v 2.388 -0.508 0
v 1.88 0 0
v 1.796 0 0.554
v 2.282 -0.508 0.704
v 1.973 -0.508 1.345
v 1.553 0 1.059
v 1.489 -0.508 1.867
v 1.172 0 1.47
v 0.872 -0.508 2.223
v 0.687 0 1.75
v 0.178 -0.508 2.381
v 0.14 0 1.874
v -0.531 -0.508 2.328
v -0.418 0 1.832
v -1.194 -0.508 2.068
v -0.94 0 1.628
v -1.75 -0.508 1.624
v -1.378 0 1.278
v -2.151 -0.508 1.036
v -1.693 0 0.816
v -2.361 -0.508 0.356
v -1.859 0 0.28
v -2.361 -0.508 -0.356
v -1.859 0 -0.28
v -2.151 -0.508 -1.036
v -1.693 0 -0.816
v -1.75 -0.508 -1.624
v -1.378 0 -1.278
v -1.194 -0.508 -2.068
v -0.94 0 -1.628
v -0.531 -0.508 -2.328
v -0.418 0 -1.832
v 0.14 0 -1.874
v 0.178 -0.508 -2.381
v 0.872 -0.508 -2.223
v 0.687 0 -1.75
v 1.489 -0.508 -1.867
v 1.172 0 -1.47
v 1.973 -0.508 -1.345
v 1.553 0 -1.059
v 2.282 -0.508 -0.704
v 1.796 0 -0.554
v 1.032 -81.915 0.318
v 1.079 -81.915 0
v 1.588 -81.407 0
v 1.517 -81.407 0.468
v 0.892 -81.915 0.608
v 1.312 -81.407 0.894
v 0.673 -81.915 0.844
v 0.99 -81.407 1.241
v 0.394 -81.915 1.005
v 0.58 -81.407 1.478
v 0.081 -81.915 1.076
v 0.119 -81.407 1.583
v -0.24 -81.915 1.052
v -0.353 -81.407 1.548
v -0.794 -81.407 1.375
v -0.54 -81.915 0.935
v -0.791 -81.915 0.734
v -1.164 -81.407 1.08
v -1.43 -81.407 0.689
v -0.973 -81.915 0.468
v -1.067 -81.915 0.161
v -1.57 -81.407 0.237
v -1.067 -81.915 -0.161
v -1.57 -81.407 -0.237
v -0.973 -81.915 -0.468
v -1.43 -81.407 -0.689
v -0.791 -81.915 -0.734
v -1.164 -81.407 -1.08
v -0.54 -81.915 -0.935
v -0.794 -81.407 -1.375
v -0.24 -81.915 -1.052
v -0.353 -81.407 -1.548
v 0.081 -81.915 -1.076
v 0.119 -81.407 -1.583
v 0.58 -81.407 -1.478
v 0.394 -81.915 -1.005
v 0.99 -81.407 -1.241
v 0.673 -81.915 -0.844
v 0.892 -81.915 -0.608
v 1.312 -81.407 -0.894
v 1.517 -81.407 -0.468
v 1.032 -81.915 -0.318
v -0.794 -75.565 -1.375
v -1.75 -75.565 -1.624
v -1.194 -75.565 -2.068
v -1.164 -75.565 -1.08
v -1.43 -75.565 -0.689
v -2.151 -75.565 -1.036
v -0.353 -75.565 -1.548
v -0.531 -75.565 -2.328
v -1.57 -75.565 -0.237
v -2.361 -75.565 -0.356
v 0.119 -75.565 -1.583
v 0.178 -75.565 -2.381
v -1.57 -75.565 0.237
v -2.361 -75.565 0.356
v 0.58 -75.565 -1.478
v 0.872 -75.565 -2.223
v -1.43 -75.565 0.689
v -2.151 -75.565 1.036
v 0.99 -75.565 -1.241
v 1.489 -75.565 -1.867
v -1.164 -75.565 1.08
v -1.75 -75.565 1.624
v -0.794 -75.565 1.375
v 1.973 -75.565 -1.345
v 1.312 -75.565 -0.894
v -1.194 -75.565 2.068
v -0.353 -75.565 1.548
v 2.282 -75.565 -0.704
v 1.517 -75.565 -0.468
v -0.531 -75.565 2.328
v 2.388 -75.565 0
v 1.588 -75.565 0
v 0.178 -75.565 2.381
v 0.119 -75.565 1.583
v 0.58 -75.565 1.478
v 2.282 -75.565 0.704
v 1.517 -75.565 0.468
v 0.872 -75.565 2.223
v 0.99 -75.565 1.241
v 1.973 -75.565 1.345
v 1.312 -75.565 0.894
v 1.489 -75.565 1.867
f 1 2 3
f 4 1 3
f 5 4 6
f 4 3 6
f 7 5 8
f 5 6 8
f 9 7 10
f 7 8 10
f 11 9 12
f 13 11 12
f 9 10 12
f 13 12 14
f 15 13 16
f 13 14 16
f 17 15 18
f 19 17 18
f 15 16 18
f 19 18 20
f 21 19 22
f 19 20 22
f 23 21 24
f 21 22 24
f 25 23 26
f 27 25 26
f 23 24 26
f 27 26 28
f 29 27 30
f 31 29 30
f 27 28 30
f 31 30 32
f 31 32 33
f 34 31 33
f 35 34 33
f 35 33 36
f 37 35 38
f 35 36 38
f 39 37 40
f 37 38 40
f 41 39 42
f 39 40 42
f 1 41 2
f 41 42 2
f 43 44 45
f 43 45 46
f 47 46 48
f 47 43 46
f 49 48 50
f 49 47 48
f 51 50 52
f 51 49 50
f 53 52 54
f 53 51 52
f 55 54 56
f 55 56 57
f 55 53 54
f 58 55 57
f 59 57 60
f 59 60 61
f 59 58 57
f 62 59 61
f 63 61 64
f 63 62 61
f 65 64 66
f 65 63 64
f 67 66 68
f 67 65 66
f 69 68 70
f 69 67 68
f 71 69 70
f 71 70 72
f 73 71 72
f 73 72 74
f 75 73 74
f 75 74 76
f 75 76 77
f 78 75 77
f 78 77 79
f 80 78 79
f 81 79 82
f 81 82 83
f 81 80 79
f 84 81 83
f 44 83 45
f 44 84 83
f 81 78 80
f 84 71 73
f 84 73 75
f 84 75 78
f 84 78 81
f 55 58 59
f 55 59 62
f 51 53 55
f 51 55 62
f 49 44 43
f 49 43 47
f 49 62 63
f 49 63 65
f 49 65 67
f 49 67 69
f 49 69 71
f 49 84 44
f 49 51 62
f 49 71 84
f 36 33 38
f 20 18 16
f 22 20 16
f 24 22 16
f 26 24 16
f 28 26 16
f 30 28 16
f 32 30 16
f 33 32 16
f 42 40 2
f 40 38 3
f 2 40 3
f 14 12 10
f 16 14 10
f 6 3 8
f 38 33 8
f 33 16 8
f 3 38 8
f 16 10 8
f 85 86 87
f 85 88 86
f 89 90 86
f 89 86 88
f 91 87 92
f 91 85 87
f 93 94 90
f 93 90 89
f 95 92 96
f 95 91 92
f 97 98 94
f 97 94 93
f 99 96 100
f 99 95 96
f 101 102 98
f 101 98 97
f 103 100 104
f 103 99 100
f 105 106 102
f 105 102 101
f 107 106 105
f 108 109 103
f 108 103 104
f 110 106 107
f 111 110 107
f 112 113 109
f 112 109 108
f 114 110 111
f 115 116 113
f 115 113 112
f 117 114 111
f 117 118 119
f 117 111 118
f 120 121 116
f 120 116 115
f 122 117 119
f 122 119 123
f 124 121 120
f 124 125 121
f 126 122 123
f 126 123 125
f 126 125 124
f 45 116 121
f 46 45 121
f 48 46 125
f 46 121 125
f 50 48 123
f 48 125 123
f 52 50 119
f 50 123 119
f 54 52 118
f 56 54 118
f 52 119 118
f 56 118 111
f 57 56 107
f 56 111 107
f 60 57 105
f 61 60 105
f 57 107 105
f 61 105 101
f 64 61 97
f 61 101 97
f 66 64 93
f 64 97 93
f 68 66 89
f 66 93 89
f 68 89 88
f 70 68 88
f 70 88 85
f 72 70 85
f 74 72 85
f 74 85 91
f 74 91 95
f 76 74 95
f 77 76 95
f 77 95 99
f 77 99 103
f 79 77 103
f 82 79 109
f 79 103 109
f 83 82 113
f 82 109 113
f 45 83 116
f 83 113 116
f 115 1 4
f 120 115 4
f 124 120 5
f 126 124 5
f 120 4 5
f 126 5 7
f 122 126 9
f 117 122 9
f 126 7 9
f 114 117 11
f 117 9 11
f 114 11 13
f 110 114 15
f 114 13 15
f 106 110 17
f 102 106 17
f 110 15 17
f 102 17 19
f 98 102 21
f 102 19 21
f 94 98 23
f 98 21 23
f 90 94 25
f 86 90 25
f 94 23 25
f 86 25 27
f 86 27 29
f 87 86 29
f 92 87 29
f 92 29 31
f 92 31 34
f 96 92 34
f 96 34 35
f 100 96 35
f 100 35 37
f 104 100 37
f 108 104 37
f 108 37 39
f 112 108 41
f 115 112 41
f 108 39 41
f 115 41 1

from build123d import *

# Parameters (mm, degrees)
F0_R     = 2.3876
F1_DEPTH = 75.565
F2_R     = 1.5875
F3_DEPTH = 6.35
F4_SIZE  = 0.508


with BuildPart() as f1:
    # F0 (on Front) → F1 (new body)
    with BuildSketch(Plane.XZ):
        Circle(F0_R)
    extrude(amount=F1_DEPTH)

    # F2 (on face) → F3 (join)
    with BuildSketch(Plane.XZ.offset(75.565)):
        Circle(F2_R)
    extrude(amount=F3_DEPTH)

    # F4
    f4_edges = [f1.edges().sort_by_distance(p)[0] for p in [
        (-1.5875, -81.915, 0),
        (-2.3876, 0, 0),
    ]]
    chamfer(f4_edges, length=F4_SIZE)


solid = f1.part
